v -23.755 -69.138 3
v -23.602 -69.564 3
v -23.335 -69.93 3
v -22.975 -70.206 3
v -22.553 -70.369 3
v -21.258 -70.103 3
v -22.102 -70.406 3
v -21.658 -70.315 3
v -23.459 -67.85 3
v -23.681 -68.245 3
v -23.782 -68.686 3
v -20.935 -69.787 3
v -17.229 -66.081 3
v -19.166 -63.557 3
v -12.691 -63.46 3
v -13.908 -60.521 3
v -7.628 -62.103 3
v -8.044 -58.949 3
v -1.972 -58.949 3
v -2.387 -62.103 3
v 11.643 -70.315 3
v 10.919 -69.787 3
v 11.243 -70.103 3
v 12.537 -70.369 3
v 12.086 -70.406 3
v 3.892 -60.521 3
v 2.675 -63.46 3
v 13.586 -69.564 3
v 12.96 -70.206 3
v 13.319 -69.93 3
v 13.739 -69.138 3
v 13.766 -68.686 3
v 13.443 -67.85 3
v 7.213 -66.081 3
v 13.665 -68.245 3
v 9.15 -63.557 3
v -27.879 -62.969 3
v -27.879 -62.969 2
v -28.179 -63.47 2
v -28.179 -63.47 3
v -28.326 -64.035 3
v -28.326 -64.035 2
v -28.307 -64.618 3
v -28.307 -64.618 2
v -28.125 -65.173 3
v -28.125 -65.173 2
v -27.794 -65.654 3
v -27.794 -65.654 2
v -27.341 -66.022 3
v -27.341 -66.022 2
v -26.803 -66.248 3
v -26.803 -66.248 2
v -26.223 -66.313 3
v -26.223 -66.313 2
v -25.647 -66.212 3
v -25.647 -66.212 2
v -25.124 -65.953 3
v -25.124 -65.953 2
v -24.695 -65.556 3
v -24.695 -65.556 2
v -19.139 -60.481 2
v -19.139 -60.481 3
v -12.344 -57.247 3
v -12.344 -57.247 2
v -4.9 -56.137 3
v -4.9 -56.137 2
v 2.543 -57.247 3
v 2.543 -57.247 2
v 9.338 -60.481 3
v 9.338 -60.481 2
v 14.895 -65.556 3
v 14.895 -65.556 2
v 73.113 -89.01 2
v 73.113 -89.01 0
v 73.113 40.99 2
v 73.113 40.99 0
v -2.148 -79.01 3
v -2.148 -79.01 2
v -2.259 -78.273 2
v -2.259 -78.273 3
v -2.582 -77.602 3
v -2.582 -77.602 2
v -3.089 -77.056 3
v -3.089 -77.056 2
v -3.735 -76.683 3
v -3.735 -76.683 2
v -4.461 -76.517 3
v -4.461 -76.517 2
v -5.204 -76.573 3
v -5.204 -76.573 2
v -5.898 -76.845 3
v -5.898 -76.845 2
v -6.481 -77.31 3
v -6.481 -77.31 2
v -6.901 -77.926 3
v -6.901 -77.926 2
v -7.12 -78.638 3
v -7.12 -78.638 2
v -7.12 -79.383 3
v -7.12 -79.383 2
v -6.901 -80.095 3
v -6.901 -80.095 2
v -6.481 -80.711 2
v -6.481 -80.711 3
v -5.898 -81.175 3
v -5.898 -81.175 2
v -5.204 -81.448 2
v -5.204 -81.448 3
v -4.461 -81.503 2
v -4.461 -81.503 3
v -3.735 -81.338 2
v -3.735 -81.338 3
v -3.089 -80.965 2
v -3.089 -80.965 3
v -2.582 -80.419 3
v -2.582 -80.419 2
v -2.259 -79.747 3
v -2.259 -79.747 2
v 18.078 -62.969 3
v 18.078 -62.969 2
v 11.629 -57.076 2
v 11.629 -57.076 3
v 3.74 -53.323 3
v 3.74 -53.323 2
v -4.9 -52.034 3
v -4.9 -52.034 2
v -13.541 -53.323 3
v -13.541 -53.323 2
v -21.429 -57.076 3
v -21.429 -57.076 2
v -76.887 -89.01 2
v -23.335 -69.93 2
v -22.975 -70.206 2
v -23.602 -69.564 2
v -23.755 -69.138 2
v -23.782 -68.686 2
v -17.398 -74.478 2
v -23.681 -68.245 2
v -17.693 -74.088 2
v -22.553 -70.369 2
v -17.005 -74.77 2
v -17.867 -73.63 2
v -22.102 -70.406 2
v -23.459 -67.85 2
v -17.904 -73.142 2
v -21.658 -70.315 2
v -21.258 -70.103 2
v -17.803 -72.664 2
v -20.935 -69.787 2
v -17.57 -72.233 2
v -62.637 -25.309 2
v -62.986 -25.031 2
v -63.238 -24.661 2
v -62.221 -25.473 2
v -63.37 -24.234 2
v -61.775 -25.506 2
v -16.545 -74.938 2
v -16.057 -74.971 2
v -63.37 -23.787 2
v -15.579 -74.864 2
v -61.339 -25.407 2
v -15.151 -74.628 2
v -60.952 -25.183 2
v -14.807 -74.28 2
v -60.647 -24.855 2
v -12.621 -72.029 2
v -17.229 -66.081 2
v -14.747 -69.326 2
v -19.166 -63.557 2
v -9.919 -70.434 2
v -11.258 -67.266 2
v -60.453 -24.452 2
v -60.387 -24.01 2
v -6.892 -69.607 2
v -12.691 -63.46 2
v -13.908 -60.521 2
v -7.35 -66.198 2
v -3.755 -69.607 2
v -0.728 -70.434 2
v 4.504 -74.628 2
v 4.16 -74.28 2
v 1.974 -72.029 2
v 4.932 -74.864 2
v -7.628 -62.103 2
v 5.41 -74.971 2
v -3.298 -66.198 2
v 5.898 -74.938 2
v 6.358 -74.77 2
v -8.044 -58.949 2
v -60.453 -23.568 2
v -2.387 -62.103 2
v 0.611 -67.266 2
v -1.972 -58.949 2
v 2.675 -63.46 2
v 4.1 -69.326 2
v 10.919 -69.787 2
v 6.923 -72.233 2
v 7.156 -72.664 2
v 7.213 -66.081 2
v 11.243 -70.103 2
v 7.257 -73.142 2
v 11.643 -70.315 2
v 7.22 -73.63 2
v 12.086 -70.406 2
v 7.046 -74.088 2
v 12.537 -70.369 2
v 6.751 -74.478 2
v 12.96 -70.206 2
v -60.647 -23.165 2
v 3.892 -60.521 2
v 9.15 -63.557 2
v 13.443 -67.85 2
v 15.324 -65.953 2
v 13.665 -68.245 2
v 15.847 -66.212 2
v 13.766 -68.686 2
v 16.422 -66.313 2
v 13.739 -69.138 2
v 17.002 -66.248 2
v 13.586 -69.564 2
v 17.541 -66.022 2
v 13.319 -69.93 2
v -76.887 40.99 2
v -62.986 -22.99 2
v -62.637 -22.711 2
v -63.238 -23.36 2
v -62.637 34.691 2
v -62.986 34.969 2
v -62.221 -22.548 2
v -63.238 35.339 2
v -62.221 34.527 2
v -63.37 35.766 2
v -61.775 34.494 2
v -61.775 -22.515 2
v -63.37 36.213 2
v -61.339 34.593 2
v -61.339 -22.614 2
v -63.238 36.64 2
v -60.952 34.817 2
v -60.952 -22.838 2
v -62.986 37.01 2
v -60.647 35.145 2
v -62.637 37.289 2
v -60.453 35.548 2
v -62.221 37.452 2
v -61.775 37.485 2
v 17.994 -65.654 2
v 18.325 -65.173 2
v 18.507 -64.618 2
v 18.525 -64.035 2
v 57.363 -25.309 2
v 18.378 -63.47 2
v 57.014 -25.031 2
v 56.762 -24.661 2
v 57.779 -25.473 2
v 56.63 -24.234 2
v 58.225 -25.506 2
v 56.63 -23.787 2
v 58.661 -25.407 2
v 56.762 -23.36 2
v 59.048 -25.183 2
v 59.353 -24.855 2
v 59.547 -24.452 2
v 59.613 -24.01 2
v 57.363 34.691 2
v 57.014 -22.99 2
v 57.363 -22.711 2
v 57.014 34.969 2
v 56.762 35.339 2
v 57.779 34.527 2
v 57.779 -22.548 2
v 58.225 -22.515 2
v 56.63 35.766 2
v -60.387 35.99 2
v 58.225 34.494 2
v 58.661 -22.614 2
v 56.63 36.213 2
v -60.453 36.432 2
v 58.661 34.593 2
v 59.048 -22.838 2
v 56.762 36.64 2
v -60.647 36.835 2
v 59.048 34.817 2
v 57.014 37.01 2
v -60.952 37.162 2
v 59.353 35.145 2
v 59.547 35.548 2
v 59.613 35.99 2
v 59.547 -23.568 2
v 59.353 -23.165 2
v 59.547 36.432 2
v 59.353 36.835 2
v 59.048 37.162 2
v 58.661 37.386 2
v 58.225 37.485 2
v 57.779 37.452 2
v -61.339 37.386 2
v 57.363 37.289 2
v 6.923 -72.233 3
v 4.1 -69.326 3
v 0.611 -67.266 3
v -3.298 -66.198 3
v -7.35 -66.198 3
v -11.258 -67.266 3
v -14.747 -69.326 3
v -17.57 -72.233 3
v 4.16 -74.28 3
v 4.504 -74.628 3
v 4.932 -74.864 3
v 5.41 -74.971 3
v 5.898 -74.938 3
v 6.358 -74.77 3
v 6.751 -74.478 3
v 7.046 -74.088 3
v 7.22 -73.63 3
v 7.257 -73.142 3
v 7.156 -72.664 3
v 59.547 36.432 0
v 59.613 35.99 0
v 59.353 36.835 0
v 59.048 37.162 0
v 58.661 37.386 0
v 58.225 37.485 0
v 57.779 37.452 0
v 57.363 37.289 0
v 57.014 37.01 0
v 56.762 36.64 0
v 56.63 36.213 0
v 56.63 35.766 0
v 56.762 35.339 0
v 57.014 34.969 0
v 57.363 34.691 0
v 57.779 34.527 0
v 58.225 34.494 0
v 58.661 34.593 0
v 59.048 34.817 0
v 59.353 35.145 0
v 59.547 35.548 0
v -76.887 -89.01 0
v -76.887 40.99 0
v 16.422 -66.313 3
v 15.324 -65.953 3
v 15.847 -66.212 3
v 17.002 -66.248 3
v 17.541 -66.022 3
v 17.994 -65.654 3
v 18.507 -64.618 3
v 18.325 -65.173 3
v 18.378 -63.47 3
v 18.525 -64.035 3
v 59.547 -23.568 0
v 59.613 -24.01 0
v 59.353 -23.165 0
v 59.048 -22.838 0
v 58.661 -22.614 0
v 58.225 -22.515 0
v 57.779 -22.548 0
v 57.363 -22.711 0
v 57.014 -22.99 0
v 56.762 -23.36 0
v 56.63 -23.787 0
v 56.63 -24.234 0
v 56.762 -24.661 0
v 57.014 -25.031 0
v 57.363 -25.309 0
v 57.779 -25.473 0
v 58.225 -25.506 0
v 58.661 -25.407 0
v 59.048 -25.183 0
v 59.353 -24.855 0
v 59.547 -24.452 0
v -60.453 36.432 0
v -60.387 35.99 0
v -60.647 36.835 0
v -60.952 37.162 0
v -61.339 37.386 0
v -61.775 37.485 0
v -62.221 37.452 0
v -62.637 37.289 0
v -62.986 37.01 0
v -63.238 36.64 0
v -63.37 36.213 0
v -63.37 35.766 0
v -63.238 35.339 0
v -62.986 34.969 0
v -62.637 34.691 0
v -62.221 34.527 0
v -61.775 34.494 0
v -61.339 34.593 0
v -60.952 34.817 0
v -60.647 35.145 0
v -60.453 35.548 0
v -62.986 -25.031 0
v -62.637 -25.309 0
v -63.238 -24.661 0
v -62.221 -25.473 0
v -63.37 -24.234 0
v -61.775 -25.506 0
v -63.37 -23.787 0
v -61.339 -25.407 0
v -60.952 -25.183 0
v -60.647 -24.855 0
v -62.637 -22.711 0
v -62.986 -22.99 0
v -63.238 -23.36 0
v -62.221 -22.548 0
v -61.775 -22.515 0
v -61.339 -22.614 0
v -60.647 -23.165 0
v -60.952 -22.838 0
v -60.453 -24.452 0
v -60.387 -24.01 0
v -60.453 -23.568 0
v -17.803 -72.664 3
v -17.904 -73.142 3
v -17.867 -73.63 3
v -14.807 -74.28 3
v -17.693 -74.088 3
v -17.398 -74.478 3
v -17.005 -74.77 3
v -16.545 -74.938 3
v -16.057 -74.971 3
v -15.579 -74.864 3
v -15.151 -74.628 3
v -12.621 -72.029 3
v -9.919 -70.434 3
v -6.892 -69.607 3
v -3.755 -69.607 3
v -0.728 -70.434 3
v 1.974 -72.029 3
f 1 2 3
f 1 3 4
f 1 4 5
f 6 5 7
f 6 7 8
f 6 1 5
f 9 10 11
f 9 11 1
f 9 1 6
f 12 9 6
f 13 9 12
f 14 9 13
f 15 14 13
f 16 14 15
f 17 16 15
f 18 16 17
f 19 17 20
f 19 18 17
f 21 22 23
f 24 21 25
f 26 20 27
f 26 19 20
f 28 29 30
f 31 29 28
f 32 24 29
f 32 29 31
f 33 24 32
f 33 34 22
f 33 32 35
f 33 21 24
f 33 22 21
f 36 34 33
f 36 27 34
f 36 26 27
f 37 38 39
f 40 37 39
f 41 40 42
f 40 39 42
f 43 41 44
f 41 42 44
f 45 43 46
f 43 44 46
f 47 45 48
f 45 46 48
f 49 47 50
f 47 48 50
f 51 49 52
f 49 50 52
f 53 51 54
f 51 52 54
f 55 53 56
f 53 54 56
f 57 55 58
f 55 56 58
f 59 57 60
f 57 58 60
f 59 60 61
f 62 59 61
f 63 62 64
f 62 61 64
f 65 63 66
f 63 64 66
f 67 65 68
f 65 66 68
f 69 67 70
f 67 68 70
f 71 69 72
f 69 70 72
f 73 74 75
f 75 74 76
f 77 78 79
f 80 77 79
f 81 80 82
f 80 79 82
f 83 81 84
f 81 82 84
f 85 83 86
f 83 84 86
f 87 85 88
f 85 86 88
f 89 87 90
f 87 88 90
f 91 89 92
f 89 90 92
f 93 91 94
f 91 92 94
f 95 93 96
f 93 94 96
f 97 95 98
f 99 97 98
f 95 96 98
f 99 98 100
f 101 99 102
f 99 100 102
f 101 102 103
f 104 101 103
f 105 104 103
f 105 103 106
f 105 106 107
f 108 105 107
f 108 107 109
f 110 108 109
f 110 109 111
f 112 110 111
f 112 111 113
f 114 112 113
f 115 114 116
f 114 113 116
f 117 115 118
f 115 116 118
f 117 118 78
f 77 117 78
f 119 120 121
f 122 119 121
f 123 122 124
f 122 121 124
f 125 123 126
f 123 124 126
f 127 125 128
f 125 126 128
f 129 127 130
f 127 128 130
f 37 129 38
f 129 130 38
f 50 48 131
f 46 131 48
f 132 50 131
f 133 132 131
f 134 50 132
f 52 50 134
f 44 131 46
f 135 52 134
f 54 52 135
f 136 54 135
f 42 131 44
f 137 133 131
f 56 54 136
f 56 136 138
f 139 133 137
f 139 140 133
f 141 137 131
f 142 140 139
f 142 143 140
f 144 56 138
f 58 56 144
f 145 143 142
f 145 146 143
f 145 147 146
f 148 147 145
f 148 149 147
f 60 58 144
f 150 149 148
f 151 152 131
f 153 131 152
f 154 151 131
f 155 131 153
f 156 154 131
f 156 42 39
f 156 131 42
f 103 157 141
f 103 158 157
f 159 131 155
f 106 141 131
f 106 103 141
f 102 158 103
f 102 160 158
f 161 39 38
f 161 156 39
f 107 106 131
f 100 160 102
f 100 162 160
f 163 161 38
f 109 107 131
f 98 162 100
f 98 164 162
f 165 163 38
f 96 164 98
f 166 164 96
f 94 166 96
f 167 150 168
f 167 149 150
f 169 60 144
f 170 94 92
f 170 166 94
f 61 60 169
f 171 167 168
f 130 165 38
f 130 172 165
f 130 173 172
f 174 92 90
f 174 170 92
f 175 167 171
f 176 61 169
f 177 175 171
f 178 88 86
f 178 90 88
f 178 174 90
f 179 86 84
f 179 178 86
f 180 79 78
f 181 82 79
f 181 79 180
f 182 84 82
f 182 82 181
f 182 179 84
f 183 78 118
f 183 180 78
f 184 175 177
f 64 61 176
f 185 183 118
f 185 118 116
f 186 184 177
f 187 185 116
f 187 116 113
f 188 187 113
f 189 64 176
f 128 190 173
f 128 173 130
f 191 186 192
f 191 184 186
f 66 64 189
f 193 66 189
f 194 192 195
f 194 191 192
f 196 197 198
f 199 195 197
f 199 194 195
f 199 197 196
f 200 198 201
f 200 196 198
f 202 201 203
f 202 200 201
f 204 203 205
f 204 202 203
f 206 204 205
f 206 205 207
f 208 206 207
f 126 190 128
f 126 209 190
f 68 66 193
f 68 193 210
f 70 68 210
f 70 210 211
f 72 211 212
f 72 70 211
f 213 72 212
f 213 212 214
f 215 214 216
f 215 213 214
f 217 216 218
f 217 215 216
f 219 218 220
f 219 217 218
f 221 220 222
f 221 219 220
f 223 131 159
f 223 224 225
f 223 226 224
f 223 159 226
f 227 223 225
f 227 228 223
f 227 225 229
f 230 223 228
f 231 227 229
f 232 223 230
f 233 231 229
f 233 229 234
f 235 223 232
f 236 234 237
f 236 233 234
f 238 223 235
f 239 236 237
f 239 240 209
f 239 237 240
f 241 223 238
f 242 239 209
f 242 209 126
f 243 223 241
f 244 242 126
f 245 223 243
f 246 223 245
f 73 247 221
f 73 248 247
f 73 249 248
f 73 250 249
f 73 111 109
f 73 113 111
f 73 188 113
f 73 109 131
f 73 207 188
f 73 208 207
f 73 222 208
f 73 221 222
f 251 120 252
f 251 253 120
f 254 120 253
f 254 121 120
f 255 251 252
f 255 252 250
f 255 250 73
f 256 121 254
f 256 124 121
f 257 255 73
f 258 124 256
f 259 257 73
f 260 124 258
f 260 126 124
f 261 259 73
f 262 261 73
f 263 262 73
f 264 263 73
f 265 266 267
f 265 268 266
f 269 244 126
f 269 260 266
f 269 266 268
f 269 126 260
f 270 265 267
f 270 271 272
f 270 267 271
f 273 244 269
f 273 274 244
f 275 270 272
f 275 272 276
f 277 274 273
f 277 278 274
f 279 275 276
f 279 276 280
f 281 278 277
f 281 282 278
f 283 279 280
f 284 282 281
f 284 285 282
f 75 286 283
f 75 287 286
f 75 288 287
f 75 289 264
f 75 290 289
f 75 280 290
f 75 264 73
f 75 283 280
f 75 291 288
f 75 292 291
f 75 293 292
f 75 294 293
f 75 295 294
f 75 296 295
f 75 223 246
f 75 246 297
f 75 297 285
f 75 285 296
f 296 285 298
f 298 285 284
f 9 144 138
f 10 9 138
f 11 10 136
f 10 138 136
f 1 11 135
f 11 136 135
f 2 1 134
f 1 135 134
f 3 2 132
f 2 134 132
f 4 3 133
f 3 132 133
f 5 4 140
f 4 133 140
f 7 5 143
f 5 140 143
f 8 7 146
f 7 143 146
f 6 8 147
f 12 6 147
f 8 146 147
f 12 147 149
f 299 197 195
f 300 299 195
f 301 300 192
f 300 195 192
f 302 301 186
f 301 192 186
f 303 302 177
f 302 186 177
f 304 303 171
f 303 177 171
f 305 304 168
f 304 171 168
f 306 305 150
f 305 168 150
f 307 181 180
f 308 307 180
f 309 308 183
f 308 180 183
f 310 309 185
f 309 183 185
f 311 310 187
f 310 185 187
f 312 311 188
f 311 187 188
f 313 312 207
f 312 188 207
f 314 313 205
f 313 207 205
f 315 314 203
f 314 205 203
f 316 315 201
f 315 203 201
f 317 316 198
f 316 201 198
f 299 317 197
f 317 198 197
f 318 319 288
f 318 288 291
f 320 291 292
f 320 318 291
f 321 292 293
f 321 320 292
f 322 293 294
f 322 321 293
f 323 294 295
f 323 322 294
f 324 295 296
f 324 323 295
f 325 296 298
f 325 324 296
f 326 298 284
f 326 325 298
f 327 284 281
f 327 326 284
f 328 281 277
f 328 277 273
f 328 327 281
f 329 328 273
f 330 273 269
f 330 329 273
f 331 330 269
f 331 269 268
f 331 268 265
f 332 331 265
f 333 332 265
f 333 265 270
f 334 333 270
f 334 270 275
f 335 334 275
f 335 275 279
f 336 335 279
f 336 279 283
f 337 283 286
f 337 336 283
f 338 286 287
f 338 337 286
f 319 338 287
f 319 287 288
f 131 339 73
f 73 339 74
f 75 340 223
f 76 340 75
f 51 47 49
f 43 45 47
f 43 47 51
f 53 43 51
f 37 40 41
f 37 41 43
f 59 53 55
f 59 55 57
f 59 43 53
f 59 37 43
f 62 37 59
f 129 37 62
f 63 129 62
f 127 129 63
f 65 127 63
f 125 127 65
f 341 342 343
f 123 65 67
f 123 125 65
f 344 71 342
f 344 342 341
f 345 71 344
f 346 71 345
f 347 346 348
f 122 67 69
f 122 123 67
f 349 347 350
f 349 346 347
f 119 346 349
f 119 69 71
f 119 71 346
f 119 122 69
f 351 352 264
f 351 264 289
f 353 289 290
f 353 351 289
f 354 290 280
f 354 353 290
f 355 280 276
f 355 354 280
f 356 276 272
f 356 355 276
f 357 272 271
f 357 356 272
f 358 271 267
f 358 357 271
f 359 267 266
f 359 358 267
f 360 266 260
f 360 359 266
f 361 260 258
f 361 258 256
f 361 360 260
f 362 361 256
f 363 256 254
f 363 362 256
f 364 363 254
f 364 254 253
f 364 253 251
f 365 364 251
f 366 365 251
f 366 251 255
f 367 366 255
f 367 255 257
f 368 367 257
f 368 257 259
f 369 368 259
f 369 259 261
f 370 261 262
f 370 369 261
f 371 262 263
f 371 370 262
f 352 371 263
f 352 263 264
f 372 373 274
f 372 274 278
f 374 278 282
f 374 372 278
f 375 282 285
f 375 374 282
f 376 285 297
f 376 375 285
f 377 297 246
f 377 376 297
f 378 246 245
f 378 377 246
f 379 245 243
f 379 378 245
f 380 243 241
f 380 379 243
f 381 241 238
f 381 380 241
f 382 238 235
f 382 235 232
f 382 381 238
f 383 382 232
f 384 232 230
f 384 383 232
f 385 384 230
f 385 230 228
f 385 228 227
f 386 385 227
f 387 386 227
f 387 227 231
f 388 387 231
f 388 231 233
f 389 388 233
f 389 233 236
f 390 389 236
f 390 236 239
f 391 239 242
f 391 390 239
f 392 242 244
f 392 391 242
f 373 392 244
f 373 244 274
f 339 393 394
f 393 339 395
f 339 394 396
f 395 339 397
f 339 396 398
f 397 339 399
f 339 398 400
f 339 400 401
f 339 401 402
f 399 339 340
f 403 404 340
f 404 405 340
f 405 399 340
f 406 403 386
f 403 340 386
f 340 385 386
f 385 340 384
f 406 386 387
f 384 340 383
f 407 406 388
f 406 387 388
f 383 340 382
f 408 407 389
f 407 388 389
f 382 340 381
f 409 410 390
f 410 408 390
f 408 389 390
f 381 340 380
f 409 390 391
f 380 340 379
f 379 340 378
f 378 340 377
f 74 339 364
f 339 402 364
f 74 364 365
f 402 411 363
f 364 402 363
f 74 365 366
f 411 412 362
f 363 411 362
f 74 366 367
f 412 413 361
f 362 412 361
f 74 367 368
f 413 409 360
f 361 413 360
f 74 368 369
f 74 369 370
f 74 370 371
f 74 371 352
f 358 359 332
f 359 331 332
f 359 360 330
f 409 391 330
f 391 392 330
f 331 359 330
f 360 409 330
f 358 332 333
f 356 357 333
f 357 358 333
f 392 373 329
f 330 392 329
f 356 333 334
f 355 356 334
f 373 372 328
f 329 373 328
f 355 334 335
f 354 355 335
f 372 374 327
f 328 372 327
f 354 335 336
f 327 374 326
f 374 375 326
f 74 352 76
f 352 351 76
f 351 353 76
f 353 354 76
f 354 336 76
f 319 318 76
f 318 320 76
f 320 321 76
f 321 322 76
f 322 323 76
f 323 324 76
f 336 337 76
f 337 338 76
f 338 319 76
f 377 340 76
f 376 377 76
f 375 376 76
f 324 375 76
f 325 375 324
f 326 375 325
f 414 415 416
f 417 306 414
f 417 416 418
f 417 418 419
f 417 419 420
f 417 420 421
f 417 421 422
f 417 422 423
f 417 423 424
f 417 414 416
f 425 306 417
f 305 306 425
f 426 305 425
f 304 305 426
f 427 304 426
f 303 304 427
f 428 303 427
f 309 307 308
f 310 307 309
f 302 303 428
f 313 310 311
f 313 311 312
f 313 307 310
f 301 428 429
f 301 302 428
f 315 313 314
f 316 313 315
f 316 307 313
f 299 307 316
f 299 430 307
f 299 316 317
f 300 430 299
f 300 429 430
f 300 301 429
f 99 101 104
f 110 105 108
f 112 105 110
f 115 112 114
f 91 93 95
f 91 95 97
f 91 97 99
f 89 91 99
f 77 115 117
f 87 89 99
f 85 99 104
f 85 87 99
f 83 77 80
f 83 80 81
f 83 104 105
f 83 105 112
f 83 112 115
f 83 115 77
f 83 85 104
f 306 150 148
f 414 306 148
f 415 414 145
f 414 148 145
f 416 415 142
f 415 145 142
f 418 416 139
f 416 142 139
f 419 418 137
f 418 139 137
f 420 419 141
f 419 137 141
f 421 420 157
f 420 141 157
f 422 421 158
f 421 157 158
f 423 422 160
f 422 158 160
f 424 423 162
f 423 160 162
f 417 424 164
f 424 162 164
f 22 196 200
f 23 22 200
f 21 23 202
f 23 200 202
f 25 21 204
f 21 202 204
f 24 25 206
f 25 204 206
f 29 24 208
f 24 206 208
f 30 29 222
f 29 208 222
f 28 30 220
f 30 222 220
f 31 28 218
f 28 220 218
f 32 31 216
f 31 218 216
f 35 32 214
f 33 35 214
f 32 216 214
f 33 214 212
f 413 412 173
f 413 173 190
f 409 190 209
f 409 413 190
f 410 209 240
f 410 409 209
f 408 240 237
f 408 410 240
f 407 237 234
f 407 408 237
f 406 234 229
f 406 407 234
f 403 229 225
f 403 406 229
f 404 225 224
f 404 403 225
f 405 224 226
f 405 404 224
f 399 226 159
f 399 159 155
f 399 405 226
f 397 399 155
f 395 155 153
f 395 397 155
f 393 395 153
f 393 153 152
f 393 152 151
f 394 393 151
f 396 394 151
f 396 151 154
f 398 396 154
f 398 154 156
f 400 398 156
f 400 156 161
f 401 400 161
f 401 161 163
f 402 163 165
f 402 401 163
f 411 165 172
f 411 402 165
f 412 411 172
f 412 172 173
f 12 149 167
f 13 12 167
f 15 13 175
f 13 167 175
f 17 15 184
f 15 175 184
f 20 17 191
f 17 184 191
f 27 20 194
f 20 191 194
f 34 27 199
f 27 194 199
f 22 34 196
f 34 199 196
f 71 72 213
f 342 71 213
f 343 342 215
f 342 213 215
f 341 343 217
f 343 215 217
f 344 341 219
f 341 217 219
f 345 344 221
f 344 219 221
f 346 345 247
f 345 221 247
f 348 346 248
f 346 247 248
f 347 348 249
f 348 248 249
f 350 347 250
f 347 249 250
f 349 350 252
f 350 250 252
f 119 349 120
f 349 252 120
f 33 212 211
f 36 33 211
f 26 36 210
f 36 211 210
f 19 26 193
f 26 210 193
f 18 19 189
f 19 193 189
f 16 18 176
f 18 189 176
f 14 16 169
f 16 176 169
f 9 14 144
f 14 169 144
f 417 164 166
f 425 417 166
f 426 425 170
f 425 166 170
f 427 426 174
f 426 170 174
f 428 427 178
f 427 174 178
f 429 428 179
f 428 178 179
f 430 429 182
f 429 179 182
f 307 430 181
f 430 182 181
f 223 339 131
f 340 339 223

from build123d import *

# Parameters (mm, degrees)
SKETCH1_W           = 150
SKETCH1_H           = 130
SKETCH1_R           = 1.5
BOSS_EXTRUDE1_DEPTH = 2
SKETCH3_R           = 2.5
BOSS_EXTRUDE2_DEPTH = 1


with BuildPart() as part:
    # Sketch1 → Boss-Extrude1 (new body)
    with BuildSketch(Plane.XY):
        with Locations((-1.886747415, -24.010339734)):
            Rectangle(SKETCH1_W, SKETCH1_H)
        with Locations((-61.886747415, 35.989660266)):
            Circle(SKETCH1_R, mode=Mode.SUBTRACT)
        with Locations((58.113252585, 35.989660266)):
            Circle(SKETCH1_R, mode=Mode.SUBTRACT)
        with Locations((-61.886747415, -24.010339734)):
            Circle(SKETCH1_R, mode=Mode.SUBTRACT)
        with Locations((58.113252585, -24.010339734)):
            Circle(SKETCH1_R, mode=Mode.SUBTRACT)
    extrude(amount=BOSS_EXTRUDE1_DEPTH)

    # Sketch3 → Boss-Extrude2 (add)
    with BuildSketch(Plane.XY.offset(2)):
        with Locations((-4.64809573, -79.010339734)):
            Circle(SKETCH3_R)
        with BuildLine():
            ThreePointArc((6.923235342, -72.232974628), (-5.323558957, -66.063152089), (-17.570353256, -72.232974628))
            ThreePointArc((-17.570353256, -72.232974628), (-17.211884144, -74.638125217), (-14.806733555, -74.279656105))
            ThreePointArc((-14.806733555, -74.279656105), (-5.323558957, -69.502119801), (4.159615641, -74.279656105))
            ThreePointArc((4.159615641, -74.279656105), (6.56476623, -74.638125217), (6.923235342, -72.232974628))
        make_face()
        with BuildLine():
            ThreePointArc((18.078397342, -62.968741701), (-4.900318567, -52.033991798), (-27.879034477, -62.968741701))
            ThreePointArc((-27.879034477, -62.968741701), (-27.581012613, -65.854503882), (-24.695250433, -65.556482018))
            ThreePointArc((-24.695250433, -65.556482018), (-4.900318567, -56.136781189), (14.894613298, -65.556482018))
            ThreePointArc((14.894613298, -65.556482018), (17.780375479, -65.854503882), (18.078397342, -62.968741701))
        make_face()
        with BuildLine():
            ThreePointArc((13.443037293, -67.850100594), (-5.007901344, -58.749928764), (-23.458839981, -67.850100594))
            ThreePointArc((-23.458839981, -67.850100594), (-23.164962626, -70.080553699), (-20.934509521, -69.786676345))
            ThreePointArc((-20.934509521, -69.786676345), (-5.007901344, -61.931527405), (10.918706833, -69.786676345))
            ThreePointArc((10.918706833, -69.786676345), (13.149159939, -70.080553699), (13.443037293, -67.850100594))
        make_face()
    extrude(amount=BOSS_EXTRUDE2_DEPTH)


solid = part.part
